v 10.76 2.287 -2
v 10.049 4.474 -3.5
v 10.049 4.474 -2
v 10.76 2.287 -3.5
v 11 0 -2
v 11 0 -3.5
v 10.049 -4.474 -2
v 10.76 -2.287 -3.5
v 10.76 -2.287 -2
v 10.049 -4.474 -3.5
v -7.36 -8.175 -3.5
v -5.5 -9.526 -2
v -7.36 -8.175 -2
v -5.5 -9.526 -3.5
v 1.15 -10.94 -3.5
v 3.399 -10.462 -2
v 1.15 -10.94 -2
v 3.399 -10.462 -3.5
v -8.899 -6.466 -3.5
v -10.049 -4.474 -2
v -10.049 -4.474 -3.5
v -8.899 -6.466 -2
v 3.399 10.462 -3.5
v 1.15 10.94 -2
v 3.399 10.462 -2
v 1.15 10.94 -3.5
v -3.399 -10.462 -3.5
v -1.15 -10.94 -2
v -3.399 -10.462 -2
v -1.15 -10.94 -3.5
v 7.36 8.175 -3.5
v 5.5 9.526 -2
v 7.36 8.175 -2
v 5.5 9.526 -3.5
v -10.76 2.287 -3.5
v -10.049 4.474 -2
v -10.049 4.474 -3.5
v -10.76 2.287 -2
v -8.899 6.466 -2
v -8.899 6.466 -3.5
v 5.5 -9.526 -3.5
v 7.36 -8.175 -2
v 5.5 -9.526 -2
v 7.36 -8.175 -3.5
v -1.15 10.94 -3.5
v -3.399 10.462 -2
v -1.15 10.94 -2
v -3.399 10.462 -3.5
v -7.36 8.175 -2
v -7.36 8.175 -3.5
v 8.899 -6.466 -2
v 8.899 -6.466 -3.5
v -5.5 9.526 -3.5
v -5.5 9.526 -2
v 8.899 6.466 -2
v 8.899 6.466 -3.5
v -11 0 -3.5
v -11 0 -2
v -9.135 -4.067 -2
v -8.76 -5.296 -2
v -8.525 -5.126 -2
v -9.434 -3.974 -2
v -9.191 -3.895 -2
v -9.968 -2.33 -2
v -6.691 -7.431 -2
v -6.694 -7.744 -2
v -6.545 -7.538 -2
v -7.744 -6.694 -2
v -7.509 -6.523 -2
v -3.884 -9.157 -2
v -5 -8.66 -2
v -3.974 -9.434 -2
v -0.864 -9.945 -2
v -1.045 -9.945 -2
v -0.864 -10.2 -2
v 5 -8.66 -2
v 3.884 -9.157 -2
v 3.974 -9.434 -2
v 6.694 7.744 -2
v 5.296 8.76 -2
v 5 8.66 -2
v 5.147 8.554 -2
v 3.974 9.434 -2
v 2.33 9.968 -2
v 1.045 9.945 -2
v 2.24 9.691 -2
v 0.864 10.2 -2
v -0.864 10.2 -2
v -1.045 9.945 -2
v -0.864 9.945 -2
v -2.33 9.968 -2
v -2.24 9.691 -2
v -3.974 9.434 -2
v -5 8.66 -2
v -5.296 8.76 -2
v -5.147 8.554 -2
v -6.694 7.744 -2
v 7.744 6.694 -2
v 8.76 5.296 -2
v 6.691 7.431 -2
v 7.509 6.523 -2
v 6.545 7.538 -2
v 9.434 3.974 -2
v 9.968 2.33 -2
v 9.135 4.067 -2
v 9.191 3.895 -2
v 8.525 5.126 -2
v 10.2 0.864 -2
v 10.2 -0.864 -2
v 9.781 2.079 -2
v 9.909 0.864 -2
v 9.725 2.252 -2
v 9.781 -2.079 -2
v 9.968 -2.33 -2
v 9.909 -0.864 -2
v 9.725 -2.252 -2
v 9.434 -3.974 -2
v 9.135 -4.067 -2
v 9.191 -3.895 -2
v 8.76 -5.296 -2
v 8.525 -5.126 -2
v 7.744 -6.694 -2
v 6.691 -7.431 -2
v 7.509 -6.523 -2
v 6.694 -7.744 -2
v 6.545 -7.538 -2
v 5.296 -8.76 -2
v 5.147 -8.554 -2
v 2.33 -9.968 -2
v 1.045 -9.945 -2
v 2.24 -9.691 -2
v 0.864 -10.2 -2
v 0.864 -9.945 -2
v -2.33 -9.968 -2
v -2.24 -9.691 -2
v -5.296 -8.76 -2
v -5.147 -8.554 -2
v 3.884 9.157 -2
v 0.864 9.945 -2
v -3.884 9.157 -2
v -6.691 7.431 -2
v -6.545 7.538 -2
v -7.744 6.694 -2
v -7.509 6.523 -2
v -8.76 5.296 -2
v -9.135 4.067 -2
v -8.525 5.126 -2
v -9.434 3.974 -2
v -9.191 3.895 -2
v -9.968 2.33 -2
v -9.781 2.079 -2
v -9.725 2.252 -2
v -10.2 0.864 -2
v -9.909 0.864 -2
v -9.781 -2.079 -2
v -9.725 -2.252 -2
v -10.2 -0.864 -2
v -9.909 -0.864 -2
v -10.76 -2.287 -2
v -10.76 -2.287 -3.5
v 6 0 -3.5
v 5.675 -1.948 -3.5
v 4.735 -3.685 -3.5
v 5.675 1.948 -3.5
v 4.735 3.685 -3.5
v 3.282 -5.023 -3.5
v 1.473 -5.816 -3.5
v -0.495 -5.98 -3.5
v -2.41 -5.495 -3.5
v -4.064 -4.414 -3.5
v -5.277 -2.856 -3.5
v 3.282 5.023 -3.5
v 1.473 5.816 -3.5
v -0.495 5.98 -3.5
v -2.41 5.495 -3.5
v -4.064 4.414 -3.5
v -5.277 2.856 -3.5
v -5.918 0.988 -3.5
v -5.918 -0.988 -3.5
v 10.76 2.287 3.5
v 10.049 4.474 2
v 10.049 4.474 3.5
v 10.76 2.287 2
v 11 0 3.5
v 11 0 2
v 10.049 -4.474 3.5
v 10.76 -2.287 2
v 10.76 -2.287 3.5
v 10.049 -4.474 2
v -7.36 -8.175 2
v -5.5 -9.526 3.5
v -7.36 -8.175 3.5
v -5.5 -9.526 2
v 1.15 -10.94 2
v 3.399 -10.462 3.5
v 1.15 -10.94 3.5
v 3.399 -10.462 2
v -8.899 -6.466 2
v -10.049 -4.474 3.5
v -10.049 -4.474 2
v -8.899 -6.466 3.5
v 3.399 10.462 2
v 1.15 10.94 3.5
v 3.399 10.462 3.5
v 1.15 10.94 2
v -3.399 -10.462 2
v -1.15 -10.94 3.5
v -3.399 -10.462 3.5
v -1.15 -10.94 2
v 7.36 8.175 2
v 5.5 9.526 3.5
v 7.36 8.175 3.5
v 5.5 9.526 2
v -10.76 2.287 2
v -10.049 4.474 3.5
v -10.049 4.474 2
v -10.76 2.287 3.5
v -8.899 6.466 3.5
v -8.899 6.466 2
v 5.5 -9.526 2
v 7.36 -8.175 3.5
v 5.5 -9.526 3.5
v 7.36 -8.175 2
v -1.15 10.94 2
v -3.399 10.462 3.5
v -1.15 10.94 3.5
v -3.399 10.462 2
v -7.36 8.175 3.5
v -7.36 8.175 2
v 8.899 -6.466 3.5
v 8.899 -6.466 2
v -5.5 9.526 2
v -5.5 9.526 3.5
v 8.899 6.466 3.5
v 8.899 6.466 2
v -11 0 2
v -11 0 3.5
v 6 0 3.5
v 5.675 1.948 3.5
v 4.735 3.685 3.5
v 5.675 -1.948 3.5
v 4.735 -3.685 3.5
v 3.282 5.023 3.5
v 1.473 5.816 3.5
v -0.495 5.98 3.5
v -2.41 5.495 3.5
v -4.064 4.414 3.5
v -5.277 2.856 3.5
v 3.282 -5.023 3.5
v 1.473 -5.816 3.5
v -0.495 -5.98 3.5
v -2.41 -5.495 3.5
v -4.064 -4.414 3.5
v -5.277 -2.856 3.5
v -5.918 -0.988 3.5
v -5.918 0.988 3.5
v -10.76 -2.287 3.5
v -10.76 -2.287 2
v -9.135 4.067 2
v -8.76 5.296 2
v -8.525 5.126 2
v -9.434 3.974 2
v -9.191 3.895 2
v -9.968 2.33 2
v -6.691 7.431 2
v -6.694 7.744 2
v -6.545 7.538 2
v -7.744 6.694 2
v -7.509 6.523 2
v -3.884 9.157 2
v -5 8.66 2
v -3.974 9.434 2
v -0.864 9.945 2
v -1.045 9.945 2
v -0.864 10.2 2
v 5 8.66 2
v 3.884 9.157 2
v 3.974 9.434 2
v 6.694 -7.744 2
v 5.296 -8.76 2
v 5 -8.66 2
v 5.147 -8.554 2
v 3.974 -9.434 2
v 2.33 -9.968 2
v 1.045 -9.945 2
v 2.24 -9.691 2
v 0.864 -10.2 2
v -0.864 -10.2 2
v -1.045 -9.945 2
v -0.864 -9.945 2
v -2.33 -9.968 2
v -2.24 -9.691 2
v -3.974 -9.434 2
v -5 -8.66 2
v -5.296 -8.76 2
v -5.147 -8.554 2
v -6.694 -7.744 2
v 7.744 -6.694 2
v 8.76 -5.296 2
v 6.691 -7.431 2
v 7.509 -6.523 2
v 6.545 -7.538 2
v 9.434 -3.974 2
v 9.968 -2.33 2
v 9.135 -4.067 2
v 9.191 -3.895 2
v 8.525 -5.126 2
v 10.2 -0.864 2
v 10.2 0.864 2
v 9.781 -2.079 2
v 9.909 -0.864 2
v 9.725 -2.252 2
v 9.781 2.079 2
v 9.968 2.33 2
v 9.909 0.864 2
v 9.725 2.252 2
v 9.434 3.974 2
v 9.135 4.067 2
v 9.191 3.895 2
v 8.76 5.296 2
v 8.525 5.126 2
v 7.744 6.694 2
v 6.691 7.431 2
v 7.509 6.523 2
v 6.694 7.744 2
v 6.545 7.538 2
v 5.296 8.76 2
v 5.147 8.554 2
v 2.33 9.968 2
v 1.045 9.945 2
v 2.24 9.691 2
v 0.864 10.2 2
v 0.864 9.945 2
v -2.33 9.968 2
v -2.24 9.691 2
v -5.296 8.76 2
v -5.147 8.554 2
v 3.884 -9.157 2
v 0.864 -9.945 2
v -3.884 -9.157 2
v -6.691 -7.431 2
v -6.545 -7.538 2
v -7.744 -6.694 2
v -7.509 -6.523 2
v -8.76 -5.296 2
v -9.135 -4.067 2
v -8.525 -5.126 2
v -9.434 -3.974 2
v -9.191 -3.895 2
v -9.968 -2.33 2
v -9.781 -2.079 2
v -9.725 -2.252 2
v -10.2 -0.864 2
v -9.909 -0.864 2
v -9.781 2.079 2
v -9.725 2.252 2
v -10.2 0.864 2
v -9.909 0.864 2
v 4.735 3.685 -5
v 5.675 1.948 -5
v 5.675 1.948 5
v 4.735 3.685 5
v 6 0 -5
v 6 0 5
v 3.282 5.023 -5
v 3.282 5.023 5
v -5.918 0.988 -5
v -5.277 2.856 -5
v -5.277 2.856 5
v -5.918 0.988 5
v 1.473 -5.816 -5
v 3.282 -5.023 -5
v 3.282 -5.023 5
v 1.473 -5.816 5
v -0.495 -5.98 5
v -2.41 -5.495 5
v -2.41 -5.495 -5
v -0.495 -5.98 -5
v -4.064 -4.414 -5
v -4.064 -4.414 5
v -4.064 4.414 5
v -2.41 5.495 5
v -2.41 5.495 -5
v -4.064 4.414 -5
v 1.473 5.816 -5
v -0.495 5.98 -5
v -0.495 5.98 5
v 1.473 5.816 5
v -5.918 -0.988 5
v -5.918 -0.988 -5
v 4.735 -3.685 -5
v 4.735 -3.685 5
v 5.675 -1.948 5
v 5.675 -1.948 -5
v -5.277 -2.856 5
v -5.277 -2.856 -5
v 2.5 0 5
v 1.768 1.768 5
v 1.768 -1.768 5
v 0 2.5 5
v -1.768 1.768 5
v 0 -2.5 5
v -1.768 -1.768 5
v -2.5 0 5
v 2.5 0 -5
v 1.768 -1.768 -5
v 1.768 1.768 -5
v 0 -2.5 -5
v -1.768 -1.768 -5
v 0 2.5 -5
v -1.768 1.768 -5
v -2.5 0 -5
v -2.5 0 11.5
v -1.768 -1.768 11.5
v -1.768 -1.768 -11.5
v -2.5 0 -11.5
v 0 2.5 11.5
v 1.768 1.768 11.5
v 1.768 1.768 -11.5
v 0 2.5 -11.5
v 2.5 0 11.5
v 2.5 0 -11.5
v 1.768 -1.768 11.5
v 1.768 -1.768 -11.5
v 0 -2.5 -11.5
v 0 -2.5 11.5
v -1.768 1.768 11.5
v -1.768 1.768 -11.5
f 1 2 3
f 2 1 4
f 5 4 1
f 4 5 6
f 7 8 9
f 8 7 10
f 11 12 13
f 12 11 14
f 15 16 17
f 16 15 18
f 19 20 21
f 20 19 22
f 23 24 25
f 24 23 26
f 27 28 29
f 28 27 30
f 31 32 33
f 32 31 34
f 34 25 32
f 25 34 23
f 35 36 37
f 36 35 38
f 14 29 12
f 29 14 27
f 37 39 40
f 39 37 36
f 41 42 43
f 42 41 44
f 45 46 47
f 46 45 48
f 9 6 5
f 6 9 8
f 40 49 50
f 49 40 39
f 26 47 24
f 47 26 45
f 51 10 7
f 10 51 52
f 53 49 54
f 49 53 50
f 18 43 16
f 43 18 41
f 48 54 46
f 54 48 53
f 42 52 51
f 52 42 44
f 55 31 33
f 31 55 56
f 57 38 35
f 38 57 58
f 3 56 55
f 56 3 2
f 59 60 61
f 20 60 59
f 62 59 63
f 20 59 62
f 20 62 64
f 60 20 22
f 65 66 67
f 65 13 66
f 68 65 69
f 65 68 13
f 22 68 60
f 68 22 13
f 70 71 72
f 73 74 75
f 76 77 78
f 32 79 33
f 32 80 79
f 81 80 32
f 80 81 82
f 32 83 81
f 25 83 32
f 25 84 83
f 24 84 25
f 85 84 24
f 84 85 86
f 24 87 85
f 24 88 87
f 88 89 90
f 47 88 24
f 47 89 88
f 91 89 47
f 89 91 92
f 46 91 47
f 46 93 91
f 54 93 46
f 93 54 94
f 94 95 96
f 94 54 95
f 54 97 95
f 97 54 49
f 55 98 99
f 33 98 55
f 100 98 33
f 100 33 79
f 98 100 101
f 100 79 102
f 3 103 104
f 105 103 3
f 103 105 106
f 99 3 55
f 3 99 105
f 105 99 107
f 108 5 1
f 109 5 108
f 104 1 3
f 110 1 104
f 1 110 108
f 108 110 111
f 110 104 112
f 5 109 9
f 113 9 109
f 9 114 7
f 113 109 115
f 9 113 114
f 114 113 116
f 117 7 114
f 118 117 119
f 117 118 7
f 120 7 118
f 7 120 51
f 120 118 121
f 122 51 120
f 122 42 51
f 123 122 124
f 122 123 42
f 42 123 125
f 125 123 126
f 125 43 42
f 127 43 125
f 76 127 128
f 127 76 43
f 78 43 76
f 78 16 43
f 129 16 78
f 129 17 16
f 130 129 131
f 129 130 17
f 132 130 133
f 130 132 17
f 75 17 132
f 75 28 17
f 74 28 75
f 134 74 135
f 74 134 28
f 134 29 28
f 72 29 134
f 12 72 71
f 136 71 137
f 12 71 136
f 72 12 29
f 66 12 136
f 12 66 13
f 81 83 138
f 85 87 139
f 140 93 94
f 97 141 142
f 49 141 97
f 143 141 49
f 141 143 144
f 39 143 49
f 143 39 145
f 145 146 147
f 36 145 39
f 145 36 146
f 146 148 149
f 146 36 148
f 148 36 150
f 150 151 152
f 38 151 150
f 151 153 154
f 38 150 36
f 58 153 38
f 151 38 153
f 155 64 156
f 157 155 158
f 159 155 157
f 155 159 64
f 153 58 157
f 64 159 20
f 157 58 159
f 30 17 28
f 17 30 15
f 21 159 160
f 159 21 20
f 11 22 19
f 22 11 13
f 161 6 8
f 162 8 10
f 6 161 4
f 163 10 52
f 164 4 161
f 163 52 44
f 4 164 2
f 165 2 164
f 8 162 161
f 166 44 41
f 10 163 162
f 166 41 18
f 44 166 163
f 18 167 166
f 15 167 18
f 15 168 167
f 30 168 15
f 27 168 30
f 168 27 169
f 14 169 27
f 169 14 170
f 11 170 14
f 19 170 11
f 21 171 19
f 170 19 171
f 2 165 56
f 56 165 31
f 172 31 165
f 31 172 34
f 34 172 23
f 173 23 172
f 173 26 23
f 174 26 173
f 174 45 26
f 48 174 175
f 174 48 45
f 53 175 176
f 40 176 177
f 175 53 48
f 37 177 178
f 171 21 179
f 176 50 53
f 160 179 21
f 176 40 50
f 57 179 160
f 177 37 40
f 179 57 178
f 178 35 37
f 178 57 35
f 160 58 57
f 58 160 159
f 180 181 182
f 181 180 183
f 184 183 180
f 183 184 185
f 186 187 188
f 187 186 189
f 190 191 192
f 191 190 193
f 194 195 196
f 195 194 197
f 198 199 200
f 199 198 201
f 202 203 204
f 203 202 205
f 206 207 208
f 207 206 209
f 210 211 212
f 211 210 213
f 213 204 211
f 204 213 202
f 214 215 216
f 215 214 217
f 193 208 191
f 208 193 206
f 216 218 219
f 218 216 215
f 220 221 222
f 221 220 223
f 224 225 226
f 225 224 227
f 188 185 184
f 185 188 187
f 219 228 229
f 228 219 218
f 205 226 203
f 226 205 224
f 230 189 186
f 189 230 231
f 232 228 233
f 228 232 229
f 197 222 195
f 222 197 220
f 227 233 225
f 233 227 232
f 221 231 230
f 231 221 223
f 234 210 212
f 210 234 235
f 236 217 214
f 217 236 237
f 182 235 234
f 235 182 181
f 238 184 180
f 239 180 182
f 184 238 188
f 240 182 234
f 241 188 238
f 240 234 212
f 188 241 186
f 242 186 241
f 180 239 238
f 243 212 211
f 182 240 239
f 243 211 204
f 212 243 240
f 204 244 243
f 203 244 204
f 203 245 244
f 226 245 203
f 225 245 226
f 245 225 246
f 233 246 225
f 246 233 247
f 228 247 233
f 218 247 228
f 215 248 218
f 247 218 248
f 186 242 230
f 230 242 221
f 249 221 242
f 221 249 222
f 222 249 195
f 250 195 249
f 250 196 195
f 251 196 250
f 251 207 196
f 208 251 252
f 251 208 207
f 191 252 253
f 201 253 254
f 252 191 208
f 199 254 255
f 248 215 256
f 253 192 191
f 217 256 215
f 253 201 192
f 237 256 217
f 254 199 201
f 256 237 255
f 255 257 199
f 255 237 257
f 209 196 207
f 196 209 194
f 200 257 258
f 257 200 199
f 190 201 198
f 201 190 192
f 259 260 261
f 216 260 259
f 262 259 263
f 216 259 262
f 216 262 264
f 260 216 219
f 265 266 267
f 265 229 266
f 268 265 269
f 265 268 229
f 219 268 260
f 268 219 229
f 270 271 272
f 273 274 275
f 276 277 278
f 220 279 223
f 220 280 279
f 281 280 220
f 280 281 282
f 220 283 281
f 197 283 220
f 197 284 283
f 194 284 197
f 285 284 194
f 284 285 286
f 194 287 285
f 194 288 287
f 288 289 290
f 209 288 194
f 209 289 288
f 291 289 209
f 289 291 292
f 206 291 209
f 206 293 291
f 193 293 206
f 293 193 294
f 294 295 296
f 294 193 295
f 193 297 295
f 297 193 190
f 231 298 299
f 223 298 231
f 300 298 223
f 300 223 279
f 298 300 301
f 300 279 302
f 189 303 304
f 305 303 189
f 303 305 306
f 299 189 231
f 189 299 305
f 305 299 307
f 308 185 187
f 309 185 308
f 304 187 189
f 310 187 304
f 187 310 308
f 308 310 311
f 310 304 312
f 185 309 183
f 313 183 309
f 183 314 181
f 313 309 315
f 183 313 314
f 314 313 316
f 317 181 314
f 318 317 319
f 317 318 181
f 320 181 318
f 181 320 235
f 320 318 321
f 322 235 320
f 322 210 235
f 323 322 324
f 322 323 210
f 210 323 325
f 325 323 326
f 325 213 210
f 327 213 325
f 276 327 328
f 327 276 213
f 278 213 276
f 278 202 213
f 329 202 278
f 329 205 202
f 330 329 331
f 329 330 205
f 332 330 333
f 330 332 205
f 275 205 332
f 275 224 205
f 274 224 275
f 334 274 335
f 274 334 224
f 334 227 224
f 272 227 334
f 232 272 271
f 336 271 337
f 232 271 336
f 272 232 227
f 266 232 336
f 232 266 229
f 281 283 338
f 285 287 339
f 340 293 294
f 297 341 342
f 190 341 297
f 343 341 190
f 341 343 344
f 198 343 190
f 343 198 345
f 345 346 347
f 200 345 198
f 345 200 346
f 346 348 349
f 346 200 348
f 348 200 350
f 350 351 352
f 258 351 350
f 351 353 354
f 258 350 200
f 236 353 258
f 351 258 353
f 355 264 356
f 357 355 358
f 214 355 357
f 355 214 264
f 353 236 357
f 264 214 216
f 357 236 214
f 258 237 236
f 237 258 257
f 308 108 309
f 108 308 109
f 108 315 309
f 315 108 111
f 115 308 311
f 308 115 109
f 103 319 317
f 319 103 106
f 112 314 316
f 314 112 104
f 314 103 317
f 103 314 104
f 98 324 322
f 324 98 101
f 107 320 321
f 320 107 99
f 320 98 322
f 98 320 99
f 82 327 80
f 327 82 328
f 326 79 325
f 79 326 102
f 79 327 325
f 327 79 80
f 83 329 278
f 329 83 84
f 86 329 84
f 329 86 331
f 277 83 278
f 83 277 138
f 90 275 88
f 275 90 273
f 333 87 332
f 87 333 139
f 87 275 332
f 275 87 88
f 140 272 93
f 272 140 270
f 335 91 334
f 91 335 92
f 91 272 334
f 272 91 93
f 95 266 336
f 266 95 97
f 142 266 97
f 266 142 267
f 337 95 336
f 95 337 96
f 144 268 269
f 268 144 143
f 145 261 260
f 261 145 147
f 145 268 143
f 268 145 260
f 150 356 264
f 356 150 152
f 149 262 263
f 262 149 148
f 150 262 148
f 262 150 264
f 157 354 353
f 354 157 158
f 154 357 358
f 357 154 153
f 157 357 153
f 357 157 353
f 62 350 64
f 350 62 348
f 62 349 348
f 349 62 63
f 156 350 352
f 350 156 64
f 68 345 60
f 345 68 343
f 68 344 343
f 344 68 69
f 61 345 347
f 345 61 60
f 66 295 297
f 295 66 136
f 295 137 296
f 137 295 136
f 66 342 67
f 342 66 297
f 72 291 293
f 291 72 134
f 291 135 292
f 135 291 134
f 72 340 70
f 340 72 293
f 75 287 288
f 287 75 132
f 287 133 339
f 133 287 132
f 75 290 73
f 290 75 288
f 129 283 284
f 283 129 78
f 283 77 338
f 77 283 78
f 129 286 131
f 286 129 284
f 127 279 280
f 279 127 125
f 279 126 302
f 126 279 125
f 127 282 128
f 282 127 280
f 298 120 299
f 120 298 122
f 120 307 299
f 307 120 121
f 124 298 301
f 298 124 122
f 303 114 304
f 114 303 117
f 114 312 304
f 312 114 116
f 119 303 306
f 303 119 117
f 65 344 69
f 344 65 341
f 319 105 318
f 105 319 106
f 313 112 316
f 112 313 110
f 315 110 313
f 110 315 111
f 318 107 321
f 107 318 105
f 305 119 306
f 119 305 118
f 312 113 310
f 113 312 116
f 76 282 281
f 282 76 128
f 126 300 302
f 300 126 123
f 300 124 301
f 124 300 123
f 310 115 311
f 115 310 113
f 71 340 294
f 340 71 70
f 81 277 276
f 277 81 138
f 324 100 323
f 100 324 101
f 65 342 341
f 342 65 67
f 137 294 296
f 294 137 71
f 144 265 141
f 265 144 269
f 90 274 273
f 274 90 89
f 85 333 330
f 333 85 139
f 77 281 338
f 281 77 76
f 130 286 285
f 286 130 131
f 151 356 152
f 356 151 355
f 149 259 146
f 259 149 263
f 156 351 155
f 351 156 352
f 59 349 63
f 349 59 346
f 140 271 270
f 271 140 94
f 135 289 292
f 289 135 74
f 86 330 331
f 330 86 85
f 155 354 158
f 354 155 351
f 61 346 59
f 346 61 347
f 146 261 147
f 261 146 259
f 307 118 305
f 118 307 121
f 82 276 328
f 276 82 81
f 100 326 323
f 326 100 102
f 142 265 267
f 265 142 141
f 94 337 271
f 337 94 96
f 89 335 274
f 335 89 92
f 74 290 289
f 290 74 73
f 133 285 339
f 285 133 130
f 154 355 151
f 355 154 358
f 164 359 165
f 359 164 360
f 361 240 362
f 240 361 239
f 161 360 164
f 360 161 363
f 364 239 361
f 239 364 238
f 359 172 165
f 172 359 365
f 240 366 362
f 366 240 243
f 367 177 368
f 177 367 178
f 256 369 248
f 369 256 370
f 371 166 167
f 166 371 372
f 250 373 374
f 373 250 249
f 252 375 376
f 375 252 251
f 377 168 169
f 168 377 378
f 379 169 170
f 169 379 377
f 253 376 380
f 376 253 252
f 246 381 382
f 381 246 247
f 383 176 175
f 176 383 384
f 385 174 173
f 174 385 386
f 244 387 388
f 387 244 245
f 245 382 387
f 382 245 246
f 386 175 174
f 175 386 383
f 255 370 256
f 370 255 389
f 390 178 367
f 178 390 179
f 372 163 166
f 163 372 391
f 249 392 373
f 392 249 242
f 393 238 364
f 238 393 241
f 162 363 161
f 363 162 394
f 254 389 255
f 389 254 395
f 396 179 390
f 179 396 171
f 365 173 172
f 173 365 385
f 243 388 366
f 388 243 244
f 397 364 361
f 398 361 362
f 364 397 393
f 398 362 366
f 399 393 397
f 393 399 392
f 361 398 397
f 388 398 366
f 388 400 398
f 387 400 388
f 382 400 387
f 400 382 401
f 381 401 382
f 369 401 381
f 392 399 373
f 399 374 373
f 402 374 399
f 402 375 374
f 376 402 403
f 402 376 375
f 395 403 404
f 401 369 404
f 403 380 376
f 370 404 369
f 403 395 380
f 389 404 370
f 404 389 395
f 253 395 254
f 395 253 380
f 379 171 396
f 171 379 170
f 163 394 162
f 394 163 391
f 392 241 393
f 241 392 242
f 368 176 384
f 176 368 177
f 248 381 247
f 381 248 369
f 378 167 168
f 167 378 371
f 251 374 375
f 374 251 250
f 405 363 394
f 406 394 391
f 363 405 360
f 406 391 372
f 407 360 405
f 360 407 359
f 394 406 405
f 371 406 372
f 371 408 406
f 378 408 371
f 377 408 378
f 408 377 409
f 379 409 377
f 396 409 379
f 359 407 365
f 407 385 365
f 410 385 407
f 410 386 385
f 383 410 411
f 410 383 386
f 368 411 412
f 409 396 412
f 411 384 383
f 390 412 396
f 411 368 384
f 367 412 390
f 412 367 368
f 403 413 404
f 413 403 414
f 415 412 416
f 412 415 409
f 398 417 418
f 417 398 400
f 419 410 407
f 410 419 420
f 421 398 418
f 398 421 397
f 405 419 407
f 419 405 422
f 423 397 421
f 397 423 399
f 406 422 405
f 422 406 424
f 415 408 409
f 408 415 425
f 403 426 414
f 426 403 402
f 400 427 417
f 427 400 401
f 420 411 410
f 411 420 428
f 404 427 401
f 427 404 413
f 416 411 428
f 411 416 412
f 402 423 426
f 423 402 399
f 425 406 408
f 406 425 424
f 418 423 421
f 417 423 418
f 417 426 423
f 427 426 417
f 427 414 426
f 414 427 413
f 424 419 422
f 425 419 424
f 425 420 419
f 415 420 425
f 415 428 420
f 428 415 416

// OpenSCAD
// Parameters
pulley_type_is_toothed = 1; //[0:1:1]
tooth_count = 20; //[10:60:1]
outer_diameter_mm = 20; //[10:40:1]
belt_width_mm = 6; //[3:20:1]
bore_diameter_mm = 5; //[2.5:10:0.5]
hub_length_mm = 10; //[5:25:1]
hub_diameter_mm = 12; //[6:24:1]
flange_diameter_mm = 22; //[11:44:1]
flange_thickness_mm = 1.5; //[0.8:4:0.1]
flange_enabled = 1; //[0:1:1]
set_screw_count = 0; //[0:4:1]
set_screw_diameter_mm = 3; //[2:6:0.5]
set_screw_z_offset_mm = 5; //[0:20:0.5]
rim_thickness_mm = 3; //[1.5:8:0.5]
tooth_radial_height_mm = 1.2; //[0.6:3:0.1]
tooth_tangential_width_factor = 0.55; //[0.3:0.8:0.05]
connection_overlap_mm = 1; //[0.5:2:0.1]
set_screw_length_mm = 50; //[20:120:1]

// Pulley module
module pulley() {
  color("Silver") {
    // Pulley wheel body
    difference() {
      cylinder(r=outer_diameter_mm/2, h=belt_width_mm, center=true);
      if (pulley_type_is_toothed == 0) {
        // Smooth rim inner cut
        cylinder(r=outer_diameter_mm/2 - rim_thickness_mm, h=belt_width_mm + 2*connection_overlap_mm, center=true);
      }
    }
    
    // Hub
    translate([0, 0, 0])
      cylinder(r=hub_diameter_mm/2, h=hub_length_mm, center=true);
    
    // Flanges
    if (flange_enabled) {
      translate([0, 0, -(belt_width_mm/2 + flange_thickness_mm/2 - connection_overlap_mm)])
        cylinder(r=flange_diameter_mm/2, h=flange_thickness_mm, center=true);
      translate([0, 0, (belt_width_mm/2 + flange_thickness_mm/2 - connection_overlap_mm)])
        cylinder(r=flange_diameter_mm/2, h=flange_thickness_mm, center=true);
    }
    
    // Central bore
    translate([0, 0, 0])
      cylinder(r=bore_diameter_mm/2, h=hub_length_mm + belt_width_mm + 2*flange_thickness_mm + 4*connection_overlap_mm, center=true);
    
    // Teeth
    if (pulley_type_is_toothed == 1) {
      for (i = [0:tooth_count-1]) {
        rotate([0, 0, i*360/tooth_count]) {
          translate([(outer_diameter_mm/2) + (tooth_radial_height_mm/2) - connection_overlap_mm, 0, 0])
            cube([tooth_radial_height_mm, (outer_diameter_mm*3.141592653589793/tooth_count)*tooth_tangential_width_factor, belt_width_mm], center=true);
        }
      }
    }
    
    // Set screw holes
    if (set_screw_count > 0) {
      for (i = [0:set_screw_count-1]) {
        rotate([0, 0, i*360/set_screw_count]) {
          translate([0, 0, -hub_length_mm/2 + set_screw_z_offset_mm])
            rotate([0, 90, 0])
              cylinder(r=set_screw_diameter_mm/2, h=set_screw_length_mm, center=true);
        }
      }
    }
  }
}

// Assembly
module assembly() {
  pulley();
}

assembly();
